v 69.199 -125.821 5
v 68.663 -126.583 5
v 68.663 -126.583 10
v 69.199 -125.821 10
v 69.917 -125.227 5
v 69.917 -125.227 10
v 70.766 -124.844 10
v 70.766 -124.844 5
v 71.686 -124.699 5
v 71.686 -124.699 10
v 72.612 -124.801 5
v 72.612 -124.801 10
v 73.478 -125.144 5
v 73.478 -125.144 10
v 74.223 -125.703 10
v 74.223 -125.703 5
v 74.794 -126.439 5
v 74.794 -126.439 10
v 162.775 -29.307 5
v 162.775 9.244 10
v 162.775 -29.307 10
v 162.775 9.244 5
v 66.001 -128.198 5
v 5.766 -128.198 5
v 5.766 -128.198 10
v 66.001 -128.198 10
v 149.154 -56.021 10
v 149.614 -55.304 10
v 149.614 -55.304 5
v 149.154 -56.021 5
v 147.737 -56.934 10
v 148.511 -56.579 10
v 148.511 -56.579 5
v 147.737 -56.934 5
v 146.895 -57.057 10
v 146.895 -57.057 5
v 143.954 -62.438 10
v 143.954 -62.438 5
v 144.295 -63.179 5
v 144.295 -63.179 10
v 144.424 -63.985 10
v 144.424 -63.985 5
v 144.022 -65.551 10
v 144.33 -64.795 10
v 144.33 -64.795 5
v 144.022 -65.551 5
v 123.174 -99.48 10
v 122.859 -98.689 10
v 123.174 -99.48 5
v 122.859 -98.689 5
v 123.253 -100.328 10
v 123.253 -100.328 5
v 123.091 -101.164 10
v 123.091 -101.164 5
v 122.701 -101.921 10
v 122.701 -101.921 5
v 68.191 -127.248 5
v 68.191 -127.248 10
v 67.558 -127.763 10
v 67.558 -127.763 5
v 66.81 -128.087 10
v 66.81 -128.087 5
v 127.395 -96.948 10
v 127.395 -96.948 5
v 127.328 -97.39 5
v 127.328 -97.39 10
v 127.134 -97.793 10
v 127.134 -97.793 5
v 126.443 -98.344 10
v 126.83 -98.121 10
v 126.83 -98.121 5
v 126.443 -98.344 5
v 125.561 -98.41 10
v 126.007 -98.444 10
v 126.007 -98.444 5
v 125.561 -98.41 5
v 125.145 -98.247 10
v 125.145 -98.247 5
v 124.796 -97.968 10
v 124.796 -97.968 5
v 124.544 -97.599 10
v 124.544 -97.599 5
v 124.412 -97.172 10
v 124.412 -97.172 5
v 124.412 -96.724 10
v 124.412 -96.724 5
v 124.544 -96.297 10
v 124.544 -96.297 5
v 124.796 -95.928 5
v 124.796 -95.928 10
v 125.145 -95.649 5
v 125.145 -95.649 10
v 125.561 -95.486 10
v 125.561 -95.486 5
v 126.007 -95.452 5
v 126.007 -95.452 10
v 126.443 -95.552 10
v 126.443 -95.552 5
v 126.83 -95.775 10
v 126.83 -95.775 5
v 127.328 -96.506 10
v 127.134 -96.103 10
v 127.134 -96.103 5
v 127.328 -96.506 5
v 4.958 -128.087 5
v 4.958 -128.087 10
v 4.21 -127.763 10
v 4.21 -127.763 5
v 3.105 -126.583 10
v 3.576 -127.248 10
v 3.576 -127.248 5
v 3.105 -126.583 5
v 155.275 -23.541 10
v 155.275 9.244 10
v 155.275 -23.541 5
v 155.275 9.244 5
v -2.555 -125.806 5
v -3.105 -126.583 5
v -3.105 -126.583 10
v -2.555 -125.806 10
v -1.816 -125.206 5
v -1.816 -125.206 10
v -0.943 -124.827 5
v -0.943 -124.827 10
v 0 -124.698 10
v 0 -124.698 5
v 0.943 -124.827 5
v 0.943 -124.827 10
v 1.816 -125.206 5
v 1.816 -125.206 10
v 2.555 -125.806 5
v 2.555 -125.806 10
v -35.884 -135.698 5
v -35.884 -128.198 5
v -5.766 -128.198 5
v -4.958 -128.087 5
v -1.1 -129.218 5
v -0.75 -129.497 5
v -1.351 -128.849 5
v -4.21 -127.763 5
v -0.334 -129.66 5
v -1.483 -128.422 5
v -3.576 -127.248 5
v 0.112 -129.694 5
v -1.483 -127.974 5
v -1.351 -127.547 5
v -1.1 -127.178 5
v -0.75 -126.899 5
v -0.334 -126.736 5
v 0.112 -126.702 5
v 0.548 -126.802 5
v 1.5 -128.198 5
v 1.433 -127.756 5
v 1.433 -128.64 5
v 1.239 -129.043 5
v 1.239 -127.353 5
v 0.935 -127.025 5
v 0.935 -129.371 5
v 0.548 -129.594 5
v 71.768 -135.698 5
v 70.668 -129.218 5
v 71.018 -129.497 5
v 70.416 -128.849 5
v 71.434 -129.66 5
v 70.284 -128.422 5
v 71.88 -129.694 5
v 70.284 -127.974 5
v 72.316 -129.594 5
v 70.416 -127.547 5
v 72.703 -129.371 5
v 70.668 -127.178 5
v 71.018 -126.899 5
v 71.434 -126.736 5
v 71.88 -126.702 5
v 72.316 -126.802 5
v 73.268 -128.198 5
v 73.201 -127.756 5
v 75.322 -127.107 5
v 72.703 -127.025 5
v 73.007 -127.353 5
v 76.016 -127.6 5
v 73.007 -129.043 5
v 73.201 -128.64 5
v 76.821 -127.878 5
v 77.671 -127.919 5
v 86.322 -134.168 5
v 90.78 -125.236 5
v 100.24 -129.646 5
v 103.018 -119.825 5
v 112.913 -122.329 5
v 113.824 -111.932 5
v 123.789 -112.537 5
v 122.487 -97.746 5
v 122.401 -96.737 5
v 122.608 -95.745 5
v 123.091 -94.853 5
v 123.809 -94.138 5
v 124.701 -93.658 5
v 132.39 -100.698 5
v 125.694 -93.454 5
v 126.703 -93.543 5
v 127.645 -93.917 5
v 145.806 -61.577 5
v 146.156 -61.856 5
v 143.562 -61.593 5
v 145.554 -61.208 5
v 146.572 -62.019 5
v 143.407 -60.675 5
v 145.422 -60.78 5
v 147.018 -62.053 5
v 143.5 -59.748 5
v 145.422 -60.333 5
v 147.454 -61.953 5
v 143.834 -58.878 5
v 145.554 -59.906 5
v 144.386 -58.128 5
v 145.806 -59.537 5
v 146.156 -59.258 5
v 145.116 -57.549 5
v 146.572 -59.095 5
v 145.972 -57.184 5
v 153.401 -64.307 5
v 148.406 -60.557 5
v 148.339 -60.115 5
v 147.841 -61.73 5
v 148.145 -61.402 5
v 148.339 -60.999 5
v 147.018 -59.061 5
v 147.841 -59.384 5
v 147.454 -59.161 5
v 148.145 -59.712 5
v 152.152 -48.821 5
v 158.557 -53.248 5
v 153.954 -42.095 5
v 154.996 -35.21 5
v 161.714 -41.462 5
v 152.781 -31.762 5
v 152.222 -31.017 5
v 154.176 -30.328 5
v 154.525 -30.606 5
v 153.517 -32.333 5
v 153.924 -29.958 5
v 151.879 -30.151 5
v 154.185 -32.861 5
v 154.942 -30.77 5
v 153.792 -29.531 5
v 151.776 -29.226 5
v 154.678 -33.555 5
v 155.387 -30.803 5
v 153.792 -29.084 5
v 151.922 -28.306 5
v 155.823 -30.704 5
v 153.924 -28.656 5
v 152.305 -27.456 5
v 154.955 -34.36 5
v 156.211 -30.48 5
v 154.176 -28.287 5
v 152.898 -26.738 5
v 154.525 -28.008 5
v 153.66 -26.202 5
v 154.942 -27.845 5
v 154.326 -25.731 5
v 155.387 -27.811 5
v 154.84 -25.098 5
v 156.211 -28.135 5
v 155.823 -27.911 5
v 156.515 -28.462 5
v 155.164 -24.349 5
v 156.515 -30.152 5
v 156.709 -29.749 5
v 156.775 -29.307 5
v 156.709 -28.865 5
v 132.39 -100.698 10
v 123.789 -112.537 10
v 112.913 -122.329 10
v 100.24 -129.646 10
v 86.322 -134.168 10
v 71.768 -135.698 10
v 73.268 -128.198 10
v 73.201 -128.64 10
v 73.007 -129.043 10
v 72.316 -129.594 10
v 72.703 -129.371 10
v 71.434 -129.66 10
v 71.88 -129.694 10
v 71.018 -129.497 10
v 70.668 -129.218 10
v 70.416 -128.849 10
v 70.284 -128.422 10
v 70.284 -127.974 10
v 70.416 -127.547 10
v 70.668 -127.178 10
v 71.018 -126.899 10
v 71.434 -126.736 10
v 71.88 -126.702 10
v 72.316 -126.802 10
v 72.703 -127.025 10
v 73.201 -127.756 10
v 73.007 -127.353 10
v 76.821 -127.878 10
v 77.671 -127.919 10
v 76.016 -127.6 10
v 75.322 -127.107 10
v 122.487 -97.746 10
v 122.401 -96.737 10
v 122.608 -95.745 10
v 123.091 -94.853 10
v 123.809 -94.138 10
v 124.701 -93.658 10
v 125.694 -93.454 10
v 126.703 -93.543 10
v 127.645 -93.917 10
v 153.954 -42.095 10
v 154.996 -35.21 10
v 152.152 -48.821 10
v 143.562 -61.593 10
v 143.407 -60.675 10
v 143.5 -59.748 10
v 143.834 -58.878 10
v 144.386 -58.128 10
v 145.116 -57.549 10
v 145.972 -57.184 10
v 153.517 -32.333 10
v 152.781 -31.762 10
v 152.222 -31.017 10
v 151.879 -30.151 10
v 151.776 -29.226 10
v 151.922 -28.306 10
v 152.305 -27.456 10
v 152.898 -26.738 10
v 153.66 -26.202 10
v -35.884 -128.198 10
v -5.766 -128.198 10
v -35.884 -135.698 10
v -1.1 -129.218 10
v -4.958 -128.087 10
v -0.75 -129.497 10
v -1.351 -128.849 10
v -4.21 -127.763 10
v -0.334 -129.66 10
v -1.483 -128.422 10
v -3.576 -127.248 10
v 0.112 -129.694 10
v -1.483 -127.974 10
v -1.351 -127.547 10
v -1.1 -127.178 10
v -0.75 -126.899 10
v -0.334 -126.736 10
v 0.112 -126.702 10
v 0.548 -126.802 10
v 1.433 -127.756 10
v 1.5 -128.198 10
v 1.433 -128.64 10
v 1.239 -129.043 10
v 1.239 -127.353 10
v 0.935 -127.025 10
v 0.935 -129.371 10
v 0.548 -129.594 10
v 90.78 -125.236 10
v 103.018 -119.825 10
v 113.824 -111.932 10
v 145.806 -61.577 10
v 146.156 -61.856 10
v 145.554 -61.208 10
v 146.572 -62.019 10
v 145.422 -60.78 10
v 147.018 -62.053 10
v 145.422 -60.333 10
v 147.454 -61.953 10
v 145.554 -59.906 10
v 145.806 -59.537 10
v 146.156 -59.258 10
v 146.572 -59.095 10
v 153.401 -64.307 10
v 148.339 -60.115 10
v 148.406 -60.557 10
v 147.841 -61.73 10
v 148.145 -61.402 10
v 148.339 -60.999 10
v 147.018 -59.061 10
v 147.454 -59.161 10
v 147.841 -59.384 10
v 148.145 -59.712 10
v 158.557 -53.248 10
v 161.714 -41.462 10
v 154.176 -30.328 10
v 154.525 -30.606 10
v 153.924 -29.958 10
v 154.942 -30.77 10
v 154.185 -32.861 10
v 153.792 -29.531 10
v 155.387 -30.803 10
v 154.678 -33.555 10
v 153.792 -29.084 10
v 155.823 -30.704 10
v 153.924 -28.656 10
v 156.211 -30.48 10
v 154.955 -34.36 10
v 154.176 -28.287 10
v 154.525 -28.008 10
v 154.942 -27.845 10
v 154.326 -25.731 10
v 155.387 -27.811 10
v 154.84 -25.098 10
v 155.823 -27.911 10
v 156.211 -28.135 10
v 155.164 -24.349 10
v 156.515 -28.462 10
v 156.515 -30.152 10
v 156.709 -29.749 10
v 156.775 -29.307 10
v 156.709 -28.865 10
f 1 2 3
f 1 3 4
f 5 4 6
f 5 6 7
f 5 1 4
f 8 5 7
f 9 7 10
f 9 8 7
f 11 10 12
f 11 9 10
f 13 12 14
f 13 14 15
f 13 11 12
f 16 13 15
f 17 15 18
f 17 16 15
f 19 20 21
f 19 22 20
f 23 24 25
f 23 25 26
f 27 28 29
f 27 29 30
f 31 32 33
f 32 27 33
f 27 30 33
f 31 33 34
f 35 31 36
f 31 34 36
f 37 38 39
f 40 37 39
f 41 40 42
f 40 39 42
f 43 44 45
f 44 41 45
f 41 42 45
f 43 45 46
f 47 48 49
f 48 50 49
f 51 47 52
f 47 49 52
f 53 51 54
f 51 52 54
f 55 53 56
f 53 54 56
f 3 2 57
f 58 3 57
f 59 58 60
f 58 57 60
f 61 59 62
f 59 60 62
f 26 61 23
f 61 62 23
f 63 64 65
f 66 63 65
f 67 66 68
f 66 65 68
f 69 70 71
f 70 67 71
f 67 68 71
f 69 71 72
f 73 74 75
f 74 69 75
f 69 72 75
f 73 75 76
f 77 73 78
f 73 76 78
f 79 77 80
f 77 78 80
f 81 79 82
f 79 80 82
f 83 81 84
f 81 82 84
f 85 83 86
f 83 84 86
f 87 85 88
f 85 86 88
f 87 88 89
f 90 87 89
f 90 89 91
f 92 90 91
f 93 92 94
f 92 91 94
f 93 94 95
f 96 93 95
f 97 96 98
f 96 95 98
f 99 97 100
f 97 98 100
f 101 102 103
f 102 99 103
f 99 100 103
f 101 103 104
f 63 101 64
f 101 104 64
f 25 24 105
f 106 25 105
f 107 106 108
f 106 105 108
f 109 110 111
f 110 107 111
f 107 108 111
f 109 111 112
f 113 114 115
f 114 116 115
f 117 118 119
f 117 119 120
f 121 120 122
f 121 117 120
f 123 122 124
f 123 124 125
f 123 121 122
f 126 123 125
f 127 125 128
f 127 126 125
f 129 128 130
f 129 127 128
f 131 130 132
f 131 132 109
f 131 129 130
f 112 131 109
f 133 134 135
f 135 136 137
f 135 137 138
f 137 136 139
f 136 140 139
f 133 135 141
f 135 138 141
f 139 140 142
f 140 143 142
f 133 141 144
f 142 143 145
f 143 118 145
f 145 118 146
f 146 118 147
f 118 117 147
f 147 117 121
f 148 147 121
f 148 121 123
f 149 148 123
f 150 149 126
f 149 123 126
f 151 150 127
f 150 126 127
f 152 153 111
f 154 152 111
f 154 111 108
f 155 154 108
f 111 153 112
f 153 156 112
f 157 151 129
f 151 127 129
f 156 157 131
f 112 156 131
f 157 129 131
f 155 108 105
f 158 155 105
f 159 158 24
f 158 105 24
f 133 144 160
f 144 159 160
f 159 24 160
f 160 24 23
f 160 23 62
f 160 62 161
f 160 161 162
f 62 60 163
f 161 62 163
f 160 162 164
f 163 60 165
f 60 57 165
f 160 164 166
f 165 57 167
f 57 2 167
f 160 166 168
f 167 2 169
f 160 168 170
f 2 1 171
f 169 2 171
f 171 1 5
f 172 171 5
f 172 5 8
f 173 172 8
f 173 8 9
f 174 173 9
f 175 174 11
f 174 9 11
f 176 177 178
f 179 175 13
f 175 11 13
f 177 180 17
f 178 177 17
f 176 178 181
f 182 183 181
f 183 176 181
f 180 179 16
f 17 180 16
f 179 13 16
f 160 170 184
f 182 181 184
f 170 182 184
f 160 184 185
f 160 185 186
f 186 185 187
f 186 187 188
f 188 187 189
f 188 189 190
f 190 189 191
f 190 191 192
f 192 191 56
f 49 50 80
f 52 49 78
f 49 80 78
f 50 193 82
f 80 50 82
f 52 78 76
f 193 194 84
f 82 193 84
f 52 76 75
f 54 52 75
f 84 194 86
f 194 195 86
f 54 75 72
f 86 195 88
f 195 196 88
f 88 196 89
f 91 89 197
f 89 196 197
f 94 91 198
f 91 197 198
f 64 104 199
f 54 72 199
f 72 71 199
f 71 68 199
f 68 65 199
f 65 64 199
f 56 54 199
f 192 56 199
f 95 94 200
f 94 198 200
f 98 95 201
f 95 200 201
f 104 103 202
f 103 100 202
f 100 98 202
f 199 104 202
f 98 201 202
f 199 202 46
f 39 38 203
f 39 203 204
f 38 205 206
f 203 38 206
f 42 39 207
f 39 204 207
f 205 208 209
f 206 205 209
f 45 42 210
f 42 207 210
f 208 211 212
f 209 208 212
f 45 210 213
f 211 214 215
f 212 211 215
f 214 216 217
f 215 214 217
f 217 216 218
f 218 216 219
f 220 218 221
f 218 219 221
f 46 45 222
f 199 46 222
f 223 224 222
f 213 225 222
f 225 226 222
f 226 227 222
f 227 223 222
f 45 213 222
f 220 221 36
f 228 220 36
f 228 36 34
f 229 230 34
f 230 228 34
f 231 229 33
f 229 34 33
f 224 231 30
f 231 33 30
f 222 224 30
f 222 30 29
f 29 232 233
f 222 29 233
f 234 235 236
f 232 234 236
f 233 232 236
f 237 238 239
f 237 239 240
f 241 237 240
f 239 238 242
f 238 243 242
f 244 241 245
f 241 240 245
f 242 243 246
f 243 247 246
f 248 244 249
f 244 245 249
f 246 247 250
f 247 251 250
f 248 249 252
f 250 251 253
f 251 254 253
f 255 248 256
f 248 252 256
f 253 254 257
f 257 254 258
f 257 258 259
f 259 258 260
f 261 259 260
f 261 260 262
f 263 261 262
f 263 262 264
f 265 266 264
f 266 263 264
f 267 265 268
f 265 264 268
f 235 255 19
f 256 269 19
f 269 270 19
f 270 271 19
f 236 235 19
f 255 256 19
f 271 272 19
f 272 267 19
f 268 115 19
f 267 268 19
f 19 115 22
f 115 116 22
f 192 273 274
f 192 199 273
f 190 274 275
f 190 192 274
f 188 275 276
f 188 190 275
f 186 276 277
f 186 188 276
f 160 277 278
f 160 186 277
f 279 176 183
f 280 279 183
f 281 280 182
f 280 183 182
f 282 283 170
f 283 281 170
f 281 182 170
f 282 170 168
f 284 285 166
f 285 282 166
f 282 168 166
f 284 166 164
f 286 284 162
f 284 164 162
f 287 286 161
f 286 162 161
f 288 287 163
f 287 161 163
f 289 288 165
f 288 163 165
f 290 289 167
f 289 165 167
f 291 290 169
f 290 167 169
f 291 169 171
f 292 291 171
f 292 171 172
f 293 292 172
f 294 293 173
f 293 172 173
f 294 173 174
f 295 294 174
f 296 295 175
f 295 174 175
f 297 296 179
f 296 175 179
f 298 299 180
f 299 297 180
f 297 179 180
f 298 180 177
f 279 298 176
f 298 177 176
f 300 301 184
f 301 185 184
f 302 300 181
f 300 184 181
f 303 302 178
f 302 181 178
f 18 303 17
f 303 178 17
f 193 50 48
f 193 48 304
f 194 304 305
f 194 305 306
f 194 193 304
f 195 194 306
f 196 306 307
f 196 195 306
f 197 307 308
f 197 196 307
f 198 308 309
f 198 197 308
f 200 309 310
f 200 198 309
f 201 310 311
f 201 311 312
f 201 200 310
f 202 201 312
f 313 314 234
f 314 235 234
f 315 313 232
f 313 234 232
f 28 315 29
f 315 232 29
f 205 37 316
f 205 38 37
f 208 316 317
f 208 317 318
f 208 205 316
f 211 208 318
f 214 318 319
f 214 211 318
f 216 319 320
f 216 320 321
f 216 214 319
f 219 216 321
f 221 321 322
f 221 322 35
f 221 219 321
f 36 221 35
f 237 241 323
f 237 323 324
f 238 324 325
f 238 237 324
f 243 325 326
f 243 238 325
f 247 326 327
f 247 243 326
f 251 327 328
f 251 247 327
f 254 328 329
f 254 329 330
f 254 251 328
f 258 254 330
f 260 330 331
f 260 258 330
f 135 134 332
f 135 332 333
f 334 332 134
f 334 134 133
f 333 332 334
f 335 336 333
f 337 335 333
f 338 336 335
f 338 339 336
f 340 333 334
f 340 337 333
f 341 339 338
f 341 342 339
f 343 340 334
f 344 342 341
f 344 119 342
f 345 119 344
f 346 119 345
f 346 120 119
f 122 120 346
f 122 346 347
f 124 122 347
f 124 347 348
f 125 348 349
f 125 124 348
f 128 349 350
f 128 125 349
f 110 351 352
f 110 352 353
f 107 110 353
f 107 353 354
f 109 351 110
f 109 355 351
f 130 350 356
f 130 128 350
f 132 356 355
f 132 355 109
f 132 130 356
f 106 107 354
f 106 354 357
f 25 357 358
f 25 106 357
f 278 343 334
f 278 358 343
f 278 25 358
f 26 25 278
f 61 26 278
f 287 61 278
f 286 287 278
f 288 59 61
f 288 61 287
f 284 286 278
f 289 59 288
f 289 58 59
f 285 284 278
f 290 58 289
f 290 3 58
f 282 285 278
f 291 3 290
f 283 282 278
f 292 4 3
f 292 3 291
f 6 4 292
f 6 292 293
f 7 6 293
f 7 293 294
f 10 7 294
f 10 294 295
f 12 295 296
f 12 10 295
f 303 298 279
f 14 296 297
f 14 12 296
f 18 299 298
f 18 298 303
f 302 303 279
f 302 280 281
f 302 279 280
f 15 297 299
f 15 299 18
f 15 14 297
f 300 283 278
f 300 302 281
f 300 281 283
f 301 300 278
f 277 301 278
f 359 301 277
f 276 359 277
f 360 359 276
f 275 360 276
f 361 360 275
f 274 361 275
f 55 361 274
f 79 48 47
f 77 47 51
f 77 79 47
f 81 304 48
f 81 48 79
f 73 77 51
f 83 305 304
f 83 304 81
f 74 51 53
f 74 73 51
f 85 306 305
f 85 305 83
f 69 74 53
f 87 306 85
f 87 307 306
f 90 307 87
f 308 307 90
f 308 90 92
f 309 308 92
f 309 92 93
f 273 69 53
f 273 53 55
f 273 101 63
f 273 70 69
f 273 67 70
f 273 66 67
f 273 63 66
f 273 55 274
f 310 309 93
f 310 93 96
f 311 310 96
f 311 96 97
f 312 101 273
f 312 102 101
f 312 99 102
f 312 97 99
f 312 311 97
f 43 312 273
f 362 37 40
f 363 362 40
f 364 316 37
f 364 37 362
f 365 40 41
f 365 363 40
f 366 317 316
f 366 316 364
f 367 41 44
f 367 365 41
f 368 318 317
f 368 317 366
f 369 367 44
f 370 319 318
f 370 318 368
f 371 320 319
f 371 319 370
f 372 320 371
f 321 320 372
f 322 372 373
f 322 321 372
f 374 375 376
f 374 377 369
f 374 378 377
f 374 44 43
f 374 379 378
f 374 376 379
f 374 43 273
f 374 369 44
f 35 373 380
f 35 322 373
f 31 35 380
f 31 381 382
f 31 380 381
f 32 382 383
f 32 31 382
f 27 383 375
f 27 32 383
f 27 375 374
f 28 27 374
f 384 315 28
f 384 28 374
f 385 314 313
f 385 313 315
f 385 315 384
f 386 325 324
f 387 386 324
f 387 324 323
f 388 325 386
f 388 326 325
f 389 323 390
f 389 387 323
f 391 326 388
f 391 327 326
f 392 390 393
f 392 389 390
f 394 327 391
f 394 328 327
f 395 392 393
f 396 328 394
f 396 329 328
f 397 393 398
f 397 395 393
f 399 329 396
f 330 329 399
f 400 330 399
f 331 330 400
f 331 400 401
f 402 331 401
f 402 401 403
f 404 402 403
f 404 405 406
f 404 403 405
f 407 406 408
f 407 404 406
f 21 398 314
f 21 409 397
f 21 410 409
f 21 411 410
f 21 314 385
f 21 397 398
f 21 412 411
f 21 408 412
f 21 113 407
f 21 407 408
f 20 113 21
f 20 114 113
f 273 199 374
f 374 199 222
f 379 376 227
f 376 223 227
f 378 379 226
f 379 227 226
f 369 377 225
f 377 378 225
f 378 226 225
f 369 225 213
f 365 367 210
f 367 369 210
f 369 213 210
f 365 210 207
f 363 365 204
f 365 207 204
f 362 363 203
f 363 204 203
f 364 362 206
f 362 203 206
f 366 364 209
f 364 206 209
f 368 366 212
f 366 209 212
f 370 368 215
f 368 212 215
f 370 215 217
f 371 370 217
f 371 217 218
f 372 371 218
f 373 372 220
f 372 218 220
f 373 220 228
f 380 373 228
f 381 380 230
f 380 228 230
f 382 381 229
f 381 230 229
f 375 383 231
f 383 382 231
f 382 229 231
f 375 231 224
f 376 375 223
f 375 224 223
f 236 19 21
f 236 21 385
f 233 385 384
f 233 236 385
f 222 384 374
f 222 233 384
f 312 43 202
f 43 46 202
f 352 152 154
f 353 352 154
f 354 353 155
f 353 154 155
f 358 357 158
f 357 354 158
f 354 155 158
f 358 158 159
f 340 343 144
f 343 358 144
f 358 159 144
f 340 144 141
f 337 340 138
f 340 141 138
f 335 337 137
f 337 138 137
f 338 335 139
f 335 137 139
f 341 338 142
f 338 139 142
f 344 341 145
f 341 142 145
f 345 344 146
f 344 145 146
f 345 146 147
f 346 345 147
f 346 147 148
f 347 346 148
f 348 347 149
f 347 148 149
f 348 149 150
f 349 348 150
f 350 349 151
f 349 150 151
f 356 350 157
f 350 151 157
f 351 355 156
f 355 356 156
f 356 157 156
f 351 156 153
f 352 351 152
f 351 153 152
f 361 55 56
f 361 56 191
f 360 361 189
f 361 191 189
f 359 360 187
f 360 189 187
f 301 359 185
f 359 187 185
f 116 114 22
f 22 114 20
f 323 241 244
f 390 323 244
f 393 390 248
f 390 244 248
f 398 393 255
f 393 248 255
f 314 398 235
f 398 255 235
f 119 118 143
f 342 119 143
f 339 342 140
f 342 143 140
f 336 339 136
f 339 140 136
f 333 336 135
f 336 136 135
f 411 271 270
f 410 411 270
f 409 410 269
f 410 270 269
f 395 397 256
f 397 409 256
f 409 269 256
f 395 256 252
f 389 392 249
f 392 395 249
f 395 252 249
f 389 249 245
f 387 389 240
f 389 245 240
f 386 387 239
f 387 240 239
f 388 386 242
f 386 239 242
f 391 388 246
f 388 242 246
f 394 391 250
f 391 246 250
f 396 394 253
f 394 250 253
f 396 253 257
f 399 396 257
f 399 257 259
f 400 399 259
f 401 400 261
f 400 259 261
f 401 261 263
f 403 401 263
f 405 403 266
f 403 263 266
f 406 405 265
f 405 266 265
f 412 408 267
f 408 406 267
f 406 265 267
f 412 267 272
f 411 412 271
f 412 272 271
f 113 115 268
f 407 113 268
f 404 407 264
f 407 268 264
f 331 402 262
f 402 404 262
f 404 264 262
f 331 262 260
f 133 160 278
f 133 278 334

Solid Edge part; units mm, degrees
sketch "Sketch1" plane through (0.0007, 14.651, 5) normal (0, 0, 1) x (1, 0, 0)
  line L0 (-114.0407, 98.8093) -> (-57.2599, 131.5929)
  arc A0 (-54.1474, 131.5247) -> (-57.2599, 131.5929) centre (-55.7598, 128.9948) ccw
  arc A1 (-47.0142, 137.1861) -> (-48.7662, 134.4664) centre (-45.7662, 134.458) ccw
  arc A2 (-47.0142, 137.1861) -> (-26.9146, 142.5706) centre (-21.0226, 80.3698) cw
  arc A3 (-24.0376, 141.0909) -> (-26.9146, 142.5706) centre (-26.6317, 139.5839) ccw
  arc A4 (-15.245, 142.849) -> (-17.9063, 141.2336) centre (-15.245, 139.849) ccw
  line L1 (-15.245, 142.849) -> (15.2436, 142.849)
  arc A5 (17.905, 141.2336) -> (15.2436, 142.849) centre (15.2436, 139.849) ccw
  arc A6 (26.9132, 142.5696) -> (24.036, 141.0904) centre (26.6298, 139.583) ccw
  arc A7 (26.9132, 142.5696) -> (47.0027, 137.1869) centre (21.0099, 80.3561) cw
  arc A8 (48.7549, 134.4673) -> (47.0027, 137.1869) centre (45.7549, 134.4587) ccw
  arc A9 (57.2487, 131.5943) -> (54.1362, 131.526) centre (55.7487, 128.9962) ccw
  line L2 (57.2487, 131.5943) -> (114.0299, 98.8129)
  arc A10 (115.5271, 96.0833) -> (114.0299, 98.8129) centre (112.5299, 96.2148) ccw
  arc A11 (124.0003, 92.7805) -> (120.7849, 92.9052) centre (122.2944, 90.3127) ccw
  arc A12 (124.0003, 92.7805) -> (155.0355, 39.027) centre (82.7747, 33.1424) cw
  arc A13 (153.5358, 36.1799) -> (155.0355, 39.027) centre (152.0454, 38.7835) ccw
  arc A14 (155.2747, 27.3761) -> (153.6593, 30.0375) centre (152.2747, 27.3761) ccw
  line L3 (155.2747, 27.3761) -> (155.2747, -38.192)
  arc A15 (153.6593, -40.8534) -> (155.2747, -38.192) centre (152.2747, -38.192) ccw
  arc A16 (154.9954, -49.8615) -> (153.5161, -46.9844) centre (152.0088, -49.5782) ccw
  arc A17 (154.9954, -49.8615) -> (149.6134, -69.9554) centre (92.7533, -43.9583) cw
  arc A18 (146.8942, -71.7079) -> (149.6134, -69.9554) centre (146.8851, -68.7079) ccw
  arc A19 (144.0217, -80.2016) -> (143.9534, -77.0892) centre (141.4236, -78.7016) ccw
  line L4 (144.0217, -80.2016) -> (127.6444, -108.5679)
  arc A20 (122.7007, -116.5716) -> (122.8583, -113.3403) centre (120.256, -114.8329) ccw
  arc A21 (77.6703, -142.5696) -> (122.7007, -116.5716) centre (71.767, -80.3476) ccw
  arc A22 (74.7931, -141.0904) -> (77.6703, -142.5696) centre (77.3869, -139.583) ccw
  arc A23 (66.0007, -142.849) -> (68.6621, -141.2336) centre (66.0007, -139.849) ccw
  line L5 (5.7656, -142.849) -> (66.0007, -142.849)
  arc A24 (3.1042, -141.2336) -> (5.7656, -142.849) centre (5.7656, -139.849) ccw
  arc A25 (-5.767, -142.849) -> (-3.1056, -141.2336) centre (-5.767, -139.849) ccw
  line L6 (-66.0021, -142.849) -> (-5.767, -142.849)
  arc A26 (-68.6634, -141.2336) -> (-66.0021, -142.849) centre (-66.0021, -139.849) ccw
  arc A27 (-77.6716, -142.5694) -> (-74.7944, -141.0903) centre (-77.3881, -139.5828) ccw
  arc A28 (-122.6994, -116.5717) -> (-77.6716, -142.5694) centre (-71.7665, -80.349) ccw
  arc A29 (-122.857, -113.3404) -> (-122.6994, -116.5717) centre (-120.2547, -114.833) ccw
  arc A30 (-128.7762, -106.6053) -> (-126.0465, -108.1024) centre (-126.1781, -105.1053) ccw
  line L7 (-144.0218, -80.199) -> (-128.7762, -106.6053)
  arc A31 (-143.9535, -77.0865) -> (-144.0218, -80.199) centre (-141.4237, -78.699) ccw
  arc A32 (-149.6144, -69.9531) -> (-146.8949, -71.7053) centre (-146.8862, -68.7053) ccw
  arc A33 (-154.9987, -49.8585) -> (-149.6144, -69.9531) centre (-92.7672, -43.9523) ccw
  arc A34 (-153.5196, -46.9813) -> (-154.9987, -49.8585) centre (-152.0122, -49.5751) ccw
  arc A35 (-155.2786, -38.189) -> (-153.6631, -40.8503) centre (-152.2786, -38.1889) ccw
  line L8 (-155.2818, 27.3758) -> (-155.2786, -38.189)
  arc A36 (-153.6665, 30.0373) -> (-155.2818, 27.3758) centre (-152.2818, 27.376) ccw
  arc A37 (-155.0428, 39.0267) -> (-153.5432, 36.1796) centre (-152.0527, 38.7832) ccw
  arc A38 (-124.0109, 92.7765) -> (-155.0428, 39.0267) centre (-82.7847, 33.1421) ccw
  arc A39 (-120.7955, 92.9014) -> (-124.0109, 92.7765) centre (-122.3049, 90.3088) ccw
  arc A40 (-114.0407, 98.8093) -> (-115.5378, 96.0796) centre (-112.5406, 96.2112) ccw
  arc A41 (-48.7662, 134.4664) -> (-54.1474, 131.5247) centre (-52.2662, 134.4761) cw
  arc A42 (-17.9064, 141.2336) -> (-24.0377, 141.0909) centre (-21.0113, 142.849) cw
  arc A43 (24.036, 141.0904) -> (17.905, 141.2336) centre (21.0099, 142.849) cw
  arc A44 (54.1362, 131.526) -> (48.7549, 134.4673) centre (52.2549, 134.4774) cw
  arc A45 (120.7849, 92.9052) -> (115.5271, 96.0832) centre (119.0237, 95.9298) cw
  arc A46 (153.6593, 30.0375) -> (153.5358, 36.1799) centre (155.2747, 33.1424) cw
  arc A47 (153.5161, -46.9844) -> (153.6593, -40.8534) centre (155.2747, -43.9583) cw
  arc A48 (143.9534, -77.0891) -> (146.8942, -71.7079) centre (146.9048, -75.2079) cw
  arc A49 (122.8584, -113.3404) -> (127.6444, -108.5679) centre (125.8944, -111.599) cw
  arc A50 (68.6621, -141.2336) -> (74.7931, -141.0904) centre (71.767, -142.849) cw
  arc A51 (-3.1056, -141.2336) -> (3.1042, -141.2336) centre (-0.0007, -142.849) cw
  arc A52 (-74.7944, -141.0903) -> (-68.6635, -141.2336) centre (-71.7684, -142.849) cw
  arc A53 (-126.0466, -108.1024) -> (-122.857, -113.3404) centre (-125.8931, -111.599) cw
  arc A54 (-146.8949, -71.7053) -> (-143.9536, -77.0866) centre (-146.905, -75.2053) cw
  arc A55 (-153.6632, -40.8503) -> (-153.5196, -46.9813) centre (-155.2784, -43.9553) cw
  arc A56 (-153.5432, 36.1796) -> (-153.6665, 30.0373) centre (-155.2821, 33.1421) cw
  arc A57 (-115.5377, 96.0796) -> (-120.7955, 92.9014) centre (-119.0344, 95.926) cw
  line L9 (-56.0166, 140.971) -> (-122.7845, 102.4212)
  arc A58 (-162.7821, 33.1421) -> (-122.7845, 102.4212) centre (-82.7847, 33.1421) cw
  line L10 (-162.7821, 33.1421) -> (-162.7784, -43.9553)
  arc A59 (-162.7784, -43.9553) -> (-153.4002, -78.9553) centre (-92.7784, -43.9553) ccw
  line L11 (-132.3882, -115.349) -> (-153.4002, -78.9553)
  arc A60 (-132.3882, -115.349) -> (-71.7683, -150.349) centre (-71.7665, -80.349) ccw
  line L12 (71.767, -150.349) -> (-71.7683, -150.349)
  arc A61 (71.767, -150.349) -> (132.3896, -115.349) centre (71.7678, -80.349) ccw
  line L13 (132.3896, -115.349) -> (153.4002, -78.9576)
  arc A62 (162.7747, -43.9583) -> (153.4002, -78.9576) centre (92.791, -43.9684) cw
  line L14 (162.7747, 33.1424) -> (162.7747, -43.9583)
  arc A63 (122.7736, 102.4251) -> (162.7747, 33.1424) centre (82.7747, 33.1424) cw
  line L15 (56.0045, 140.9728) -> (122.7736, 102.4251)
  arc A64 (21.0099, 150.349) -> (56.0045, 140.9728) centre (21.008, 80.349) cw
  line L16 (-21.0112, 150.349) -> (21.0099, 150.349)
  arc A65 (-32.5074, 149.4015) -> (-21.0112, 150.349) centre (-20.997, 79.961) cw
  arc A66 (-44.641, 146.2432) -> (-32.5074, 149.4015) centre (-21.0122, 80.3518) cw
  arc A67 (-56.0166, 140.971) -> (-44.641, 146.2432) centre (-21.0122, 80.3518) cw
  circle A68 centre (-71.7683, -142.849) radius 1.5
  circle A69 centre (-0.0007, -142.849) radius 1.5
  circle A70 centre (-125.893, -111.599) radius 1.5
  circle A71 centre (-146.905, -75.2053) radius 1.5
  circle A72 centre (-155.2784, -43.9553) radius 1.5
  circle A73 centre (-155.2821, 33.1421) radius 1.5
  circle A74 centre (-119.0344, 95.9261) radius 1.5
  circle A75 centre (-52.2662, 134.4761) radius 1.5
  circle A76 centre (-21.0112, 142.849) radius 1.5
  circle A77 centre (21.0099, 142.849) radius 1.5
  circle A78 centre (52.2549, 134.4774) radius 1.5
  circle A79 centre (119.0237, 95.9298) radius 1.5
  circle A80 centre (155.2747, 33.1424) radius 1.5
  circle A81 centre (155.2747, -43.9583) radius 1.5
  circle A82 centre (146.9048, -75.2079) radius 1.5
  circle A83 centre (125.8944, -111.599) radius 1.5
  circle A84 centre (71.767, -142.849) radius 1.5
extrude "ExtrudedProtrusion_7" add sketch "Sketch1" along normal blind 5
sketch "Sketch2" plane through (-0.003, 14.651, 10) normal (0, 0, 1) x (1, 0, 0)
  line L0 (-168.1883, -5.4066) -> (170.0115, -5.4066)
  line L1 (170.0115, -5.4066) -> (170.0115, 153.6029)
  line L2 (170.0115, 153.6029) -> (-168.1883, 153.6029)
  line L3 (-168.1883, 153.6029) -> (-168.1883, -5.4066)
extrude "Cutout1" cut sketch "Sketch2" against normal up to next
sketch "Sketch3" plane through (-0.0021, -63.2268, 10) normal (0, 0, 1) x (1, 0, 0)
  line L0 (-35.8817, -72.4712) -> (-192.1854, -72.4712)
  line L1 (-192.1854, -72.4712) -> (-192.1854, 77.1316)
  line L2 (-192.1854, 77.1316) -> (-35.8817, 77.1316)
  line L3 (-35.8817, 77.1316) -> (-35.8817, -72.4712)
extrude "Cutout2" cut sketch "Sketch3" against normal up to next
properties material "Polycarbonate"
